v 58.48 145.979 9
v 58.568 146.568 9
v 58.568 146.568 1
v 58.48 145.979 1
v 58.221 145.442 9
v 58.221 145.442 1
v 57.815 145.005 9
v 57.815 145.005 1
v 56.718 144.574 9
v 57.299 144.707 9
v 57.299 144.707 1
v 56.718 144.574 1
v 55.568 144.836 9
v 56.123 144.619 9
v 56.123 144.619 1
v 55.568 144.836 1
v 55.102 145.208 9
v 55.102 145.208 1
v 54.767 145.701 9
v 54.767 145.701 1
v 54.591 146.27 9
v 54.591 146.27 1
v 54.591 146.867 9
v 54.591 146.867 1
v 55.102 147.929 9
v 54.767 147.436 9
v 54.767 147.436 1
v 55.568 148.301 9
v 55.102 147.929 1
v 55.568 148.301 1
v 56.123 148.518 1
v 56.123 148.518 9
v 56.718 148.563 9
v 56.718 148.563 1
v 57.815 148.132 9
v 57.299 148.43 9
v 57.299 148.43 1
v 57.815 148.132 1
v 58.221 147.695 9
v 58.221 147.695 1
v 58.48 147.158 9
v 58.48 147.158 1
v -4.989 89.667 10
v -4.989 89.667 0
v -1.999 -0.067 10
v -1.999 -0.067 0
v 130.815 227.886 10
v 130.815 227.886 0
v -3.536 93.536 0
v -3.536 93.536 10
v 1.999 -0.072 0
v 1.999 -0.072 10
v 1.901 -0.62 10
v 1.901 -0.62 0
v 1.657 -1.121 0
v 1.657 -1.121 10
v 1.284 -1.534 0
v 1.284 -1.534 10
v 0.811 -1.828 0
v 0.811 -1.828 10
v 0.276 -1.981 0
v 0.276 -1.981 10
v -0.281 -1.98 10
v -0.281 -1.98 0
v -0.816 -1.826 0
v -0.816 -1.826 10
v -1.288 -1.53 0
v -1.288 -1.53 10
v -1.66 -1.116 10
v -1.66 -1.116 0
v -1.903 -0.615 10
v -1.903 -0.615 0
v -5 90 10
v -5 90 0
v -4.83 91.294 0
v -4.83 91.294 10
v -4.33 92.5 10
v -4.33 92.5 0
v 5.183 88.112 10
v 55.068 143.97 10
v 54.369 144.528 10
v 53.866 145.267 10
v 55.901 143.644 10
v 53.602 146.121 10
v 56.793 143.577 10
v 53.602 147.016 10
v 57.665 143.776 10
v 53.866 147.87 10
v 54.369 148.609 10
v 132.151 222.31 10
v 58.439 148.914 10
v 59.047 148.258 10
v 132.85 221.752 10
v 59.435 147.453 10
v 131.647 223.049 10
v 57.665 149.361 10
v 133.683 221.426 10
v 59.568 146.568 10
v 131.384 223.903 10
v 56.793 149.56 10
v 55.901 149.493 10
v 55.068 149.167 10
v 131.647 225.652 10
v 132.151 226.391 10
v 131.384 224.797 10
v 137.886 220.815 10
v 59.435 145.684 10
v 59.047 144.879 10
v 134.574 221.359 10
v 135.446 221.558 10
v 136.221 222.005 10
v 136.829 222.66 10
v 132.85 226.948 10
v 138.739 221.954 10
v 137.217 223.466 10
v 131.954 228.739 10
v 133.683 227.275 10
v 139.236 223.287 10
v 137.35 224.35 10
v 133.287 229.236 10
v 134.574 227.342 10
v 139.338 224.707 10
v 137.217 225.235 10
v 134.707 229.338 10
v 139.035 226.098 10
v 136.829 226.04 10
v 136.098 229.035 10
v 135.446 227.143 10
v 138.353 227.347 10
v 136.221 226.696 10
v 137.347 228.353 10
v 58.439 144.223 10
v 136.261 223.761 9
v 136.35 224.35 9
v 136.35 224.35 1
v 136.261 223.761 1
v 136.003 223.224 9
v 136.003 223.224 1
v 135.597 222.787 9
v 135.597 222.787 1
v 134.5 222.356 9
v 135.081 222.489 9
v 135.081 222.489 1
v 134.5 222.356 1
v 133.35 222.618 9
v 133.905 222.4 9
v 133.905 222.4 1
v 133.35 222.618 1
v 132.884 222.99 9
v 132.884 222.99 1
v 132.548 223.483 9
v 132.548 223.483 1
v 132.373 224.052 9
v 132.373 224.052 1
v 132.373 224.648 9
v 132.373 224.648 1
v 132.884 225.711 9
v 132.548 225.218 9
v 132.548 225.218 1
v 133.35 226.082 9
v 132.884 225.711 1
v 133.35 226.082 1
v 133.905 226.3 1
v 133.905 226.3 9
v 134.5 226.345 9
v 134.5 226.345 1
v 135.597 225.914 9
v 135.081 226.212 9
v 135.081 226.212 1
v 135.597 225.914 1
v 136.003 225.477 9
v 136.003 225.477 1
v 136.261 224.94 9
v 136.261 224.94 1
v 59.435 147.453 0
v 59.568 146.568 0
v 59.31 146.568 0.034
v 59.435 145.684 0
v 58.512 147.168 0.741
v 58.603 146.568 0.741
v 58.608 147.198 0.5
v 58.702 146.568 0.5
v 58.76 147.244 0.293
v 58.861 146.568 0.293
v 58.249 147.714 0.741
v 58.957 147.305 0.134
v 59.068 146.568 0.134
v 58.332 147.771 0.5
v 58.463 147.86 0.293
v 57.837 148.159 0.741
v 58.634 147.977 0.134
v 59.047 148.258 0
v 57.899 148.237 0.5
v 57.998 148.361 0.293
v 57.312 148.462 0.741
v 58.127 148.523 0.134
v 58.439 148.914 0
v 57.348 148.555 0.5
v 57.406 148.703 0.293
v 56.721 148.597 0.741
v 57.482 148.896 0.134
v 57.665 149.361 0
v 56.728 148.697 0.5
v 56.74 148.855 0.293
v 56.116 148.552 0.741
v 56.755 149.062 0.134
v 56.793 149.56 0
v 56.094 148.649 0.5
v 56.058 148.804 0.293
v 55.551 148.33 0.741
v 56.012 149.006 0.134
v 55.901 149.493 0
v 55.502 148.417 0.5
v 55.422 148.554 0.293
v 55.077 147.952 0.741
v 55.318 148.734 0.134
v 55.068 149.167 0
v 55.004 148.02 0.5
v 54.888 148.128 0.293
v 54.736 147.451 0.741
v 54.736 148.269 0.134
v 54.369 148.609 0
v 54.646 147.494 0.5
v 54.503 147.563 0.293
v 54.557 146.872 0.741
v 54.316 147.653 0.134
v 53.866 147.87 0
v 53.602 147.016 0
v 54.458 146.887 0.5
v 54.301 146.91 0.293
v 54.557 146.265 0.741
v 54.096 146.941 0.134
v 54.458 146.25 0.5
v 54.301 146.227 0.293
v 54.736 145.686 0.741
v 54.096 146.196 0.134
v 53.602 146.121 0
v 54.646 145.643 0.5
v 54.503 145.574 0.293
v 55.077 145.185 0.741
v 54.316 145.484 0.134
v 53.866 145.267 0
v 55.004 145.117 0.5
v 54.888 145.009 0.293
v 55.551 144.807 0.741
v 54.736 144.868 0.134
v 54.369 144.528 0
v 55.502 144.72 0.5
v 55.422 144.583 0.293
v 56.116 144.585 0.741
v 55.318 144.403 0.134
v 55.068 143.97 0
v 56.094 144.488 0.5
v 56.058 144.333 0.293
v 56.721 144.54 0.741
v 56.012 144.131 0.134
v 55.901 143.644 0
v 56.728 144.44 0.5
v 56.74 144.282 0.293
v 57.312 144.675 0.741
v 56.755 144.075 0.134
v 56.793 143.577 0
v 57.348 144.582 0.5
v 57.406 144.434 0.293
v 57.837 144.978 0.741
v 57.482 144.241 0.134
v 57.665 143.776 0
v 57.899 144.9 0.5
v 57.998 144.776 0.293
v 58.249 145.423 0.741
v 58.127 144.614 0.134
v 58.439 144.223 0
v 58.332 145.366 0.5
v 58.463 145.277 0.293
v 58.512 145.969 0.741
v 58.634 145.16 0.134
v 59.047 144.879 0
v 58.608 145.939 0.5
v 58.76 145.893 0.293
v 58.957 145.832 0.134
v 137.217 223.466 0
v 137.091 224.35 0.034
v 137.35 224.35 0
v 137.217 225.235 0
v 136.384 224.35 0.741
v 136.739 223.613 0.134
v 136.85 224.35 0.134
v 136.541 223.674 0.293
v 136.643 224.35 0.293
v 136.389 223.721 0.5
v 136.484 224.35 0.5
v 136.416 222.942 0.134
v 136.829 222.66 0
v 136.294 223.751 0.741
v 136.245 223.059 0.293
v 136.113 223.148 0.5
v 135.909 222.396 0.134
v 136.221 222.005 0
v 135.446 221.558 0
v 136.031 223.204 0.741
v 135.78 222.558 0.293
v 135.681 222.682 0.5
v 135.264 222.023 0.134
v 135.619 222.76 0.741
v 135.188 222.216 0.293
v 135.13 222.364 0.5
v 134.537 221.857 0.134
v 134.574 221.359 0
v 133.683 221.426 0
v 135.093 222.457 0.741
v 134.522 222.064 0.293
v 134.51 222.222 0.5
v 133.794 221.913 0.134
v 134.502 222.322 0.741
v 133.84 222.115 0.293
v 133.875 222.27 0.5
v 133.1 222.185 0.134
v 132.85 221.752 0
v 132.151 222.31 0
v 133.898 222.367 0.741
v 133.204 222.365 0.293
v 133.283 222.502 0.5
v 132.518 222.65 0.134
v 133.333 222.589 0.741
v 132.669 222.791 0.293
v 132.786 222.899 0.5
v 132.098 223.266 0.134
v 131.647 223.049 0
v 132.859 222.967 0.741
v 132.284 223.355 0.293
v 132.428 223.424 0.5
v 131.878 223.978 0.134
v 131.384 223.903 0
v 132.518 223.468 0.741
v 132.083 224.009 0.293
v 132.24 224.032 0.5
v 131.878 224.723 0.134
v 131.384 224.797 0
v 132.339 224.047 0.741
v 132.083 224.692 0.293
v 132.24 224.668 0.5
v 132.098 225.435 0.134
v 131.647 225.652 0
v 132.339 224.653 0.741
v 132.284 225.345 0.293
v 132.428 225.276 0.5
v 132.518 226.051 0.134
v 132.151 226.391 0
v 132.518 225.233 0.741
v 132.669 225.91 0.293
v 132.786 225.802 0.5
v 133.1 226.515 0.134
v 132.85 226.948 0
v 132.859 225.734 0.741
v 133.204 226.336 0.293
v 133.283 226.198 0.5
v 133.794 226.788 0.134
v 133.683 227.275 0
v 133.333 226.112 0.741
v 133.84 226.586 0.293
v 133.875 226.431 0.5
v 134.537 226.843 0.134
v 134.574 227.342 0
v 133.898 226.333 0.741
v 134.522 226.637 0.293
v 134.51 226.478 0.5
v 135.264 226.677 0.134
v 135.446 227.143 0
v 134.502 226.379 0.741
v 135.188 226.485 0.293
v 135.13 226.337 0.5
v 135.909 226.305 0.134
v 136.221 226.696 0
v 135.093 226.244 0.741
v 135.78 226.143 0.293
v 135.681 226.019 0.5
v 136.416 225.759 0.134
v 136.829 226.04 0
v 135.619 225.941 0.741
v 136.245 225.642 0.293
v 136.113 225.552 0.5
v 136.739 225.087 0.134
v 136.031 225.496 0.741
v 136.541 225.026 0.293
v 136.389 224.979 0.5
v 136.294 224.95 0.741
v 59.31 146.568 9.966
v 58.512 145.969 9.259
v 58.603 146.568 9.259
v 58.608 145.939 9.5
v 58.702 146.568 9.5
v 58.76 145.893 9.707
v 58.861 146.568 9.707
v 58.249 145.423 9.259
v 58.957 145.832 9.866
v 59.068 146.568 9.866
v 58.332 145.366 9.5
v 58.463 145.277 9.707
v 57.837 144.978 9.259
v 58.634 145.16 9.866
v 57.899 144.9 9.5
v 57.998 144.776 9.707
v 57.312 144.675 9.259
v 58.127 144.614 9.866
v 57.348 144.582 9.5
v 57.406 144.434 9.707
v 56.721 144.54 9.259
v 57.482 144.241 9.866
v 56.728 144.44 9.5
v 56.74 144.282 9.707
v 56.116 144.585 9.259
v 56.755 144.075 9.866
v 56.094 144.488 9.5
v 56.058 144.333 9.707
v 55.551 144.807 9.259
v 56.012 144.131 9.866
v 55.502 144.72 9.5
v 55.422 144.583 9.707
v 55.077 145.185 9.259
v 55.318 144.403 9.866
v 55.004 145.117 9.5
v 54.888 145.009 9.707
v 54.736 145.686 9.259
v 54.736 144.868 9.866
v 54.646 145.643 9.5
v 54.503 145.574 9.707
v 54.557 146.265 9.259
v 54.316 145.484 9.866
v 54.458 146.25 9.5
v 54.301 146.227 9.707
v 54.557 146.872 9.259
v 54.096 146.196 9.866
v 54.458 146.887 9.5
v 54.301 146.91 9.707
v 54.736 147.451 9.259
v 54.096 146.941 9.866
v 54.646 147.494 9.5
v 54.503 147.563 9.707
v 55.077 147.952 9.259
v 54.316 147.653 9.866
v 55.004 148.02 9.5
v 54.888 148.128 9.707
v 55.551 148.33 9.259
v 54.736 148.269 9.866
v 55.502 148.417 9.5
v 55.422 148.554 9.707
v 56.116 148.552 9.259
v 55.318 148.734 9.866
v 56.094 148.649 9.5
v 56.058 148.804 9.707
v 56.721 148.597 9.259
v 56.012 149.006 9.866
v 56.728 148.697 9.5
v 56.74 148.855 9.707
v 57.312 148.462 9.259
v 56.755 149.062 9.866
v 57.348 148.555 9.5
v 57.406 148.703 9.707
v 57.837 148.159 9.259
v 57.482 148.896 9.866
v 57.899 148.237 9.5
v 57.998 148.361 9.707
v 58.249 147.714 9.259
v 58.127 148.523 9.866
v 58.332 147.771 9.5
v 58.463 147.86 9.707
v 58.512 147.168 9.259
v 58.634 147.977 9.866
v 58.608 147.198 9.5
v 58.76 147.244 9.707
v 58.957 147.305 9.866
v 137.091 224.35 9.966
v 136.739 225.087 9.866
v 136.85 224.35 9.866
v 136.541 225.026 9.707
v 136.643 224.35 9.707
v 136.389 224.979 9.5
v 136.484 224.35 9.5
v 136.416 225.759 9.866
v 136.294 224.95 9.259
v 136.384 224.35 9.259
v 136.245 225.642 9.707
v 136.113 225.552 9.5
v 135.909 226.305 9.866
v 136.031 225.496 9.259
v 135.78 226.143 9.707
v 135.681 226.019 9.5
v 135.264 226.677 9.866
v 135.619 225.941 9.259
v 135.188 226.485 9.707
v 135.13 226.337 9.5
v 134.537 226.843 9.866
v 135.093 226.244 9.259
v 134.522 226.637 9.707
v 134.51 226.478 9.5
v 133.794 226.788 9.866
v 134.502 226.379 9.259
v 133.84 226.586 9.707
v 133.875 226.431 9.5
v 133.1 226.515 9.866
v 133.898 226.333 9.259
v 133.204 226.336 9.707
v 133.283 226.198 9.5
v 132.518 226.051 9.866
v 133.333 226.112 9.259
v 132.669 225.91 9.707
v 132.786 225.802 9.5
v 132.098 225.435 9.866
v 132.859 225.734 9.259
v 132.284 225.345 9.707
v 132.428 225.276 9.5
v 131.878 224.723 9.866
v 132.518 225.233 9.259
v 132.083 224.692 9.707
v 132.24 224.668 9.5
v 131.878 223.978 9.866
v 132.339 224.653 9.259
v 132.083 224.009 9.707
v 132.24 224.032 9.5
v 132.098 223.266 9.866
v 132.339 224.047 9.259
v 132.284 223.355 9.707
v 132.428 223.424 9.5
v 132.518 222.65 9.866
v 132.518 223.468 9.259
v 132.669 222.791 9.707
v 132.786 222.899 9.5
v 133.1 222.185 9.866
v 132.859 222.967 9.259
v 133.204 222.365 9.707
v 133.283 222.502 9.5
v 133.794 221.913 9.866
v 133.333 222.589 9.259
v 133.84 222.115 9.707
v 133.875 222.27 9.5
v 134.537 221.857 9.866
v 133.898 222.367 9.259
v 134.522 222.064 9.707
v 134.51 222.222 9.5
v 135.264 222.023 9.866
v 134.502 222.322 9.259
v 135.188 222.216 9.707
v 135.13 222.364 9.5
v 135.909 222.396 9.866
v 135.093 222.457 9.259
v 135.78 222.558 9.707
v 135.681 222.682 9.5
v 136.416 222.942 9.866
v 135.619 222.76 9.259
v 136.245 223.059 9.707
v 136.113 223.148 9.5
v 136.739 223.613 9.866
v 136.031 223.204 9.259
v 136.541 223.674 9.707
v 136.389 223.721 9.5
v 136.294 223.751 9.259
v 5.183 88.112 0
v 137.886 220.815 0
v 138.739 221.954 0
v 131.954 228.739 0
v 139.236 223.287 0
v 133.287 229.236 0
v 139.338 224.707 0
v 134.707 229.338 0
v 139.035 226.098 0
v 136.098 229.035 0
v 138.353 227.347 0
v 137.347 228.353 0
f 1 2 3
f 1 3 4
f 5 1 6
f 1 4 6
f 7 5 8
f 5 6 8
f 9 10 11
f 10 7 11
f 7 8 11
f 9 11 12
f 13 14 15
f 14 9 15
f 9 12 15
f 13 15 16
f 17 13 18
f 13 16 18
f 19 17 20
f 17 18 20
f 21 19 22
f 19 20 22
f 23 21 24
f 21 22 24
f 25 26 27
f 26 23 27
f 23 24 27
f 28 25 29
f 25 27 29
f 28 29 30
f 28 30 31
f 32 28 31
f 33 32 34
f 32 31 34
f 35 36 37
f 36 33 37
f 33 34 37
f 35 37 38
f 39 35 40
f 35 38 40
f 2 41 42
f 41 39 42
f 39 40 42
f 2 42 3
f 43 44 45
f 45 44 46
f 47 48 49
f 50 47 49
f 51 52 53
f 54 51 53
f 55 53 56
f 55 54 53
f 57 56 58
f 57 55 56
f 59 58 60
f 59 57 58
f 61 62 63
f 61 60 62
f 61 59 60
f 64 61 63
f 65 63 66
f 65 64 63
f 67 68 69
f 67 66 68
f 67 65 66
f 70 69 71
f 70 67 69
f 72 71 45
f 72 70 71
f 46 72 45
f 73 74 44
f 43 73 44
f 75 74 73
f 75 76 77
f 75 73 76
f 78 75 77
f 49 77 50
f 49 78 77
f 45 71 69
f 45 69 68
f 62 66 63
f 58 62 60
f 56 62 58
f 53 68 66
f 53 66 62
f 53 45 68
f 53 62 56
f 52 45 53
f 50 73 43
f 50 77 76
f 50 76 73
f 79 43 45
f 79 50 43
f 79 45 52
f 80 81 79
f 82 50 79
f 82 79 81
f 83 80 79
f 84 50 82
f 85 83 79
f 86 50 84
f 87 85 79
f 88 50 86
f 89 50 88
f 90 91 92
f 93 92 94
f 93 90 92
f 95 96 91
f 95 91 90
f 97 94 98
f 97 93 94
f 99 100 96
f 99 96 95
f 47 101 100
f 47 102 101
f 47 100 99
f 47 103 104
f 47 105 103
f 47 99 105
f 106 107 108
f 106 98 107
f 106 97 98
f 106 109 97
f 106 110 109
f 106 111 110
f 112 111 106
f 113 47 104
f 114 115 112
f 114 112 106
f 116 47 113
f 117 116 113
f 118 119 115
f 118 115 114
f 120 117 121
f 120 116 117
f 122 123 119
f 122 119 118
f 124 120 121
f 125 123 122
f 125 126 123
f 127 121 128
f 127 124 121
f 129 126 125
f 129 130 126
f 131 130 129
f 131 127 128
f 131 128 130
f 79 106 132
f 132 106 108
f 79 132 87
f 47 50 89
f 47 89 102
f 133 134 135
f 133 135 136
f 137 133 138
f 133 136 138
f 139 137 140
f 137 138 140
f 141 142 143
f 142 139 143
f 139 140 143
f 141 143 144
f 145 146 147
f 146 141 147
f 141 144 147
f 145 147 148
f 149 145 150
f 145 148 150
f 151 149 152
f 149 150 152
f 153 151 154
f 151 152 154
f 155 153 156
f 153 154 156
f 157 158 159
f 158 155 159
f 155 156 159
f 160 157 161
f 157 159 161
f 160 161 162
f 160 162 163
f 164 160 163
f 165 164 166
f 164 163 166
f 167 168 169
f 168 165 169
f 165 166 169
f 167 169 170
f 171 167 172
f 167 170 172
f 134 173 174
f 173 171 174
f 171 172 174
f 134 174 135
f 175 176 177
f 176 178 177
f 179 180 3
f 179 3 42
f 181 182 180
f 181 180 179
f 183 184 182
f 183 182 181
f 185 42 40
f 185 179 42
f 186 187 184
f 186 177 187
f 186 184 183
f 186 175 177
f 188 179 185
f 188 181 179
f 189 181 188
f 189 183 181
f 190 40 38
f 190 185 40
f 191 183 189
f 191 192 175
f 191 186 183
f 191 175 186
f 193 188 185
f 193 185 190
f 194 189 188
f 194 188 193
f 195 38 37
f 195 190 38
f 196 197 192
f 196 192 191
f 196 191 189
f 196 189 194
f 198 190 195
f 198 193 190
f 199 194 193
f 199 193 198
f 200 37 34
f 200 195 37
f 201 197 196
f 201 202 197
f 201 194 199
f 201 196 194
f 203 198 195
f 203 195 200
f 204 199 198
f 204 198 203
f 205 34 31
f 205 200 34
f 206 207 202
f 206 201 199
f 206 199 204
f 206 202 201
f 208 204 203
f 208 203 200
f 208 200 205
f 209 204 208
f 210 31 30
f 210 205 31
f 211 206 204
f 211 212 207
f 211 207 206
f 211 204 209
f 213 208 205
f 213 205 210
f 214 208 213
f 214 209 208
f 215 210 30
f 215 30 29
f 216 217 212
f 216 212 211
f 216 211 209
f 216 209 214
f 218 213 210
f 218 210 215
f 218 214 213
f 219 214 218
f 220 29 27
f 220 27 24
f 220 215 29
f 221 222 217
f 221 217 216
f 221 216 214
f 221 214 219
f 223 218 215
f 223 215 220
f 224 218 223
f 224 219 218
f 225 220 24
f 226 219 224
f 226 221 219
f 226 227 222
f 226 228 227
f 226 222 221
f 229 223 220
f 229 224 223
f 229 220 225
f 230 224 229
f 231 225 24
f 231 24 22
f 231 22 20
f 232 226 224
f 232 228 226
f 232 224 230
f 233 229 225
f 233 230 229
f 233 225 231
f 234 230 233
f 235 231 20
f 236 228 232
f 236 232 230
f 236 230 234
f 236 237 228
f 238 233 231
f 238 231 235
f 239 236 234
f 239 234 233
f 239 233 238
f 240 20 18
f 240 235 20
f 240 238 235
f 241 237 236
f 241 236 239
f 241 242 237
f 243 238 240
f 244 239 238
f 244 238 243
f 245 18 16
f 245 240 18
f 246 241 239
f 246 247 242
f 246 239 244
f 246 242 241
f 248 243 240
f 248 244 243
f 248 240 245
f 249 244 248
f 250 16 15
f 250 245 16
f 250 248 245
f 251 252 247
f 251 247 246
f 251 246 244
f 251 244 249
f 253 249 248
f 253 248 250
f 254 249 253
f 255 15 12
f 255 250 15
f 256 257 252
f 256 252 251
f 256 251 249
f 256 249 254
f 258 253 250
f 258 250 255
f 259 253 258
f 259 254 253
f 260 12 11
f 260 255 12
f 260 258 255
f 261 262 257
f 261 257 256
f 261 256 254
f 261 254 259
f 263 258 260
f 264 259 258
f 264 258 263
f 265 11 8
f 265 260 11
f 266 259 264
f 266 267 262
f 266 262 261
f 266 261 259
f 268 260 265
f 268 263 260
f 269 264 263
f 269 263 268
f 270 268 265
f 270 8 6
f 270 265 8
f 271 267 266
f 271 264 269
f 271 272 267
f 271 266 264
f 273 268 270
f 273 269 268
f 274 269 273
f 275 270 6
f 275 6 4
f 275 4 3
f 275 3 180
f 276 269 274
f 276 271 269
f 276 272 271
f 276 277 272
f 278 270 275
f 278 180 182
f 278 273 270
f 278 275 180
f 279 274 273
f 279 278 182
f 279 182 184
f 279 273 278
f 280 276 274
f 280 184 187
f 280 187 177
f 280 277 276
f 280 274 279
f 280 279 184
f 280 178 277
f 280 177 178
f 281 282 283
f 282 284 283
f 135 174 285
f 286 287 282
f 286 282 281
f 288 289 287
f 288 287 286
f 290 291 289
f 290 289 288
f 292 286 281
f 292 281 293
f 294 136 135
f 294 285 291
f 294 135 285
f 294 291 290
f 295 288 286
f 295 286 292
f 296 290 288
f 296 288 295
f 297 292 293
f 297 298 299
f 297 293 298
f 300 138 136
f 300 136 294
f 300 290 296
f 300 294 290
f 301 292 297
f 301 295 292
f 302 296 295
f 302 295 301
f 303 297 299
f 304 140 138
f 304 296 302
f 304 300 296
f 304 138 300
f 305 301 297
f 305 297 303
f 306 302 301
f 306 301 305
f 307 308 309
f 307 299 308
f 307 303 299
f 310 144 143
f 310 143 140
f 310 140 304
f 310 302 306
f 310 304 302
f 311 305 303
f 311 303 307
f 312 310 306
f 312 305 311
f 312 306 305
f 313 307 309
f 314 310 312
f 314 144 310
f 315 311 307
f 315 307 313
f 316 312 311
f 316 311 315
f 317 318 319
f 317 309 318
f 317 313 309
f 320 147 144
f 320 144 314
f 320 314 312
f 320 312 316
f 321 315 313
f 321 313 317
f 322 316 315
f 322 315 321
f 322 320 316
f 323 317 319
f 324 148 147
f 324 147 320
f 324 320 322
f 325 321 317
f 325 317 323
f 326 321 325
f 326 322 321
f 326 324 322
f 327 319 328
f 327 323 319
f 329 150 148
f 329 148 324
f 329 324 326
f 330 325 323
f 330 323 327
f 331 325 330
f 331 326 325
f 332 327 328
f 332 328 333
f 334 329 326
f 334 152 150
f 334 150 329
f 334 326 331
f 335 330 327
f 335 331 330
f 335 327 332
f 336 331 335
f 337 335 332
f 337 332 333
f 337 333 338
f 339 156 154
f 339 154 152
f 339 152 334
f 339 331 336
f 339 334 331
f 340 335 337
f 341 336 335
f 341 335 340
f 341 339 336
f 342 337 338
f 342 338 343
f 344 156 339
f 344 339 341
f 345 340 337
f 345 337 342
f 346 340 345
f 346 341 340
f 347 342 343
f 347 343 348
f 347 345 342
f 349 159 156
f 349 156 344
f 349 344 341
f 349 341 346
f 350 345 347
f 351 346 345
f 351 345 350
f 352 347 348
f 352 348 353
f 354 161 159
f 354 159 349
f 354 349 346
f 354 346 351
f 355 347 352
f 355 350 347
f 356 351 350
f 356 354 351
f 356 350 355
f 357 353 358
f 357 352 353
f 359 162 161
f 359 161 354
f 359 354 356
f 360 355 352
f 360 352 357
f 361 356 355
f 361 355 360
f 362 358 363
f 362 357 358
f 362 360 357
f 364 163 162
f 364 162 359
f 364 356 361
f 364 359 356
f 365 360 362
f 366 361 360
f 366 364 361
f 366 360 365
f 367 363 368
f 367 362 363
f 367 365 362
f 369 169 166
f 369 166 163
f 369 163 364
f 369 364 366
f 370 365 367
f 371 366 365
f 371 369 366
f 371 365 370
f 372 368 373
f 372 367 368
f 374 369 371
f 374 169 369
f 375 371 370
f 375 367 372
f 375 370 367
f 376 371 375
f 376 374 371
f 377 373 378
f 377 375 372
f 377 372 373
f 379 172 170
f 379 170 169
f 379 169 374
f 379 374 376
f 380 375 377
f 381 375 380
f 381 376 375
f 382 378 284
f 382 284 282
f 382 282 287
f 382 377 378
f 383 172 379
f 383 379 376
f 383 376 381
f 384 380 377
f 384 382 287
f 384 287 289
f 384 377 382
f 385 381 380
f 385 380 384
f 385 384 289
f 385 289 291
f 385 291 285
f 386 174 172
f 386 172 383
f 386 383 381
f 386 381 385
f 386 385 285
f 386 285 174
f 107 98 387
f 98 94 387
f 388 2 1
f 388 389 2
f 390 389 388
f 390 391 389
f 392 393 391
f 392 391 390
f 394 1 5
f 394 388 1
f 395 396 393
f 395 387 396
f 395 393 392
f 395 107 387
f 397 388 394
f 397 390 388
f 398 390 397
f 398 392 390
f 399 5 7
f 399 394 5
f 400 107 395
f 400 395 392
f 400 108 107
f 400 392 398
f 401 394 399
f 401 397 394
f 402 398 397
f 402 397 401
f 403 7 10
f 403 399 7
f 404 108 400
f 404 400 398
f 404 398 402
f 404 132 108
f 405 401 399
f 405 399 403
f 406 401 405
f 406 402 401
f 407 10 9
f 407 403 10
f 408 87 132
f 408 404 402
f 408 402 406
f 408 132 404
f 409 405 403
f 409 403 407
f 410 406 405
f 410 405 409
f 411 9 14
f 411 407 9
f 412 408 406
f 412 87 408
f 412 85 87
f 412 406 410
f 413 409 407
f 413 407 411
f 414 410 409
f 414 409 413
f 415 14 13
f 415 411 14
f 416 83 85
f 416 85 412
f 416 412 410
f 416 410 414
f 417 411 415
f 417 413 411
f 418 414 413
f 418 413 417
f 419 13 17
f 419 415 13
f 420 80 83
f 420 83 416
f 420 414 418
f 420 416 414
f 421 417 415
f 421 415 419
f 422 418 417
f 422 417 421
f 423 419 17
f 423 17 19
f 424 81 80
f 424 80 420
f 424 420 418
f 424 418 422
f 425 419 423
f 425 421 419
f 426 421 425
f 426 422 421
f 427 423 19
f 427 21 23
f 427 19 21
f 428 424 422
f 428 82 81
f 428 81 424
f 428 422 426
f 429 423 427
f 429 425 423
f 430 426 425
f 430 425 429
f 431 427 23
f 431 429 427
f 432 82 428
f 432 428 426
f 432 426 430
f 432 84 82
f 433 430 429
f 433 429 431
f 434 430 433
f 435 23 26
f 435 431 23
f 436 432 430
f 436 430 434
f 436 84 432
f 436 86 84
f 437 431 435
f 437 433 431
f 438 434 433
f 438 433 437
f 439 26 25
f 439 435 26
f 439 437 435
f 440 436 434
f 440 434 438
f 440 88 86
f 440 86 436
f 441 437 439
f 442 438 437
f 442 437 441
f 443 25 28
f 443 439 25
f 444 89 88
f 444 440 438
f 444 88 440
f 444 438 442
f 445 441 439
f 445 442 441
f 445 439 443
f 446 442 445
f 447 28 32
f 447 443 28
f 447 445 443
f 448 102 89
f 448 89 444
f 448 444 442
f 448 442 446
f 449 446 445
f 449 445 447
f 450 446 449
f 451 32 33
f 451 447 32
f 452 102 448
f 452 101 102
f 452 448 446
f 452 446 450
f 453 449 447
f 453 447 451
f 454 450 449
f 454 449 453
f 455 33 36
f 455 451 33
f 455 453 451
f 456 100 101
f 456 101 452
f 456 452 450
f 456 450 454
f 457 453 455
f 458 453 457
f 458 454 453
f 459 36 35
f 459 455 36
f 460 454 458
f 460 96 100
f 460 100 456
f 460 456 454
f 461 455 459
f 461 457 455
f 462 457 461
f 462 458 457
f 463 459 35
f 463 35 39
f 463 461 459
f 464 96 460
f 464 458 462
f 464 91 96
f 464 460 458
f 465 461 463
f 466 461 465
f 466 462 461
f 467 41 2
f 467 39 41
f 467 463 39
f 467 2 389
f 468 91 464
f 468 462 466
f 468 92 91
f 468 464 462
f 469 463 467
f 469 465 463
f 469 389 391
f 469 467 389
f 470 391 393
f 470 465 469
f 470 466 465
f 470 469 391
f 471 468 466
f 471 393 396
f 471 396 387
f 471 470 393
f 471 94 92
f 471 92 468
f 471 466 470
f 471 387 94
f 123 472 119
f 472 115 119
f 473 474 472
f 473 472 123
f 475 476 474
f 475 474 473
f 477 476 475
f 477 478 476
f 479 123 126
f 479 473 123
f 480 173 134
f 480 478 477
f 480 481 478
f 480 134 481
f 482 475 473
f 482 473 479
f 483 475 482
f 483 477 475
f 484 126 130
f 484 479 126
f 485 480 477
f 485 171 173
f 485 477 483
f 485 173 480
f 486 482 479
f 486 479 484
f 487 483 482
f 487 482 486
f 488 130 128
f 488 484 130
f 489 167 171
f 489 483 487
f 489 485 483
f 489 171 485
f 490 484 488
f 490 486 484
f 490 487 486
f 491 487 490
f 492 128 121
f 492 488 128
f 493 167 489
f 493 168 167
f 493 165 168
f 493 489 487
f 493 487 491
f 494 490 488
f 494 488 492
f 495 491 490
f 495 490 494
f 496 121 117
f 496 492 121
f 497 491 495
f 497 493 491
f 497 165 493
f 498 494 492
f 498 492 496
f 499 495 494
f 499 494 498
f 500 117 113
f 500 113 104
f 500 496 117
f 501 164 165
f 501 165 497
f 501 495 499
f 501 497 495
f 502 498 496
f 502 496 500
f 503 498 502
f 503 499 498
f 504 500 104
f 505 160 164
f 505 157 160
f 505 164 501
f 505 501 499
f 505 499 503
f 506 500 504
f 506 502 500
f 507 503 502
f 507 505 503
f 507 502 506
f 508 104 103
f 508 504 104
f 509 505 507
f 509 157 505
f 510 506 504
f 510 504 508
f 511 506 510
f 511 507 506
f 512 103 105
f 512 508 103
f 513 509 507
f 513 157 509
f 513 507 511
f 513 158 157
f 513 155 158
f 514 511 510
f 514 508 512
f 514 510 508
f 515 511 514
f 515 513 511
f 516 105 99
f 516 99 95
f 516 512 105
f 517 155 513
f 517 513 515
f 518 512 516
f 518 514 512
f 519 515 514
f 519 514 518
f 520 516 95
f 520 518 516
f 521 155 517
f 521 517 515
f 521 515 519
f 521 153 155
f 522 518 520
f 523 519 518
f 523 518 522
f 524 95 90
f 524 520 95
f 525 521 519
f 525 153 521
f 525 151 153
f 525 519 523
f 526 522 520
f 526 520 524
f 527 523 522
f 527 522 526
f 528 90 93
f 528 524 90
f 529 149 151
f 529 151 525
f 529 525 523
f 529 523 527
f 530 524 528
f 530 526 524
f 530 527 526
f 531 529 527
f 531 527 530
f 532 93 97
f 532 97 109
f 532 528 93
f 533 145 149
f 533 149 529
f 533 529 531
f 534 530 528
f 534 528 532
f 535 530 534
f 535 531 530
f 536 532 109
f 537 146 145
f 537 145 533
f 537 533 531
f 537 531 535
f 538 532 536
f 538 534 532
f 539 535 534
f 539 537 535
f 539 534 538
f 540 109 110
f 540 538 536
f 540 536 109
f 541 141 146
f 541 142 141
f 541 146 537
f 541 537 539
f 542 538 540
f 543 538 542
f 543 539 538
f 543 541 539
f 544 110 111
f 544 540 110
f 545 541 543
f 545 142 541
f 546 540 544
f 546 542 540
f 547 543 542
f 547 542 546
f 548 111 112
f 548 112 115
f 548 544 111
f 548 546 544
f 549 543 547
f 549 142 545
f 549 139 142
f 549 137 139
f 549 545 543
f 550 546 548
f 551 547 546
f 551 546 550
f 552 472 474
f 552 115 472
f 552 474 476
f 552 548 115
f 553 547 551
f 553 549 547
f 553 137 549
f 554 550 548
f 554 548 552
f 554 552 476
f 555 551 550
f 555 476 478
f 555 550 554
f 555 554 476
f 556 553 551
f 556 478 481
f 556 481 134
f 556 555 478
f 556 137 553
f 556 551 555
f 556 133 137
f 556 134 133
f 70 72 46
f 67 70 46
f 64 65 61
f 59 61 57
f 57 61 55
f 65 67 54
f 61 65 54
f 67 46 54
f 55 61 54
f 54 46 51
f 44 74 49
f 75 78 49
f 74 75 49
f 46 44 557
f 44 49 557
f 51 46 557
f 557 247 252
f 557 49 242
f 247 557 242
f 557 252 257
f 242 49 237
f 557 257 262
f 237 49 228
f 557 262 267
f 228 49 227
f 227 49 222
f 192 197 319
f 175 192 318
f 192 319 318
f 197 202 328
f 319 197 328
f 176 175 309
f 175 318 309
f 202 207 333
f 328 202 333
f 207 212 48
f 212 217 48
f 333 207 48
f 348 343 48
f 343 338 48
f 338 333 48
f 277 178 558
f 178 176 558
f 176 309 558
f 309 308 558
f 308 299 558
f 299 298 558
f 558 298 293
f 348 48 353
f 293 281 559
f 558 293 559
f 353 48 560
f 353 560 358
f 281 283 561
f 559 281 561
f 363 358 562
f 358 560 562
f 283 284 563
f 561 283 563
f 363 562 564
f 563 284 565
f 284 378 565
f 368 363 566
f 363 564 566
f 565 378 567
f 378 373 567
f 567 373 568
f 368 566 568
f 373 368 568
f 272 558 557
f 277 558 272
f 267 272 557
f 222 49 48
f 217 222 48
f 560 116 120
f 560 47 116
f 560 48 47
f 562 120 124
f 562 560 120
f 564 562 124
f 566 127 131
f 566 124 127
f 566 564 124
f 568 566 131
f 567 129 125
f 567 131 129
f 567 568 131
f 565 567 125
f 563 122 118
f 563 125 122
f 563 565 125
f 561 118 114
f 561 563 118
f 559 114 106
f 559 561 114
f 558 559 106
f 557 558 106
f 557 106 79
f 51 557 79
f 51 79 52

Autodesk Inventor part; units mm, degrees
ref_plane "YZ Plane" through (0, 0, 0) normal (1, 0, 0) x (0, 1, 0)
ref_plane "XZ Plane" through (0, 0, 0) normal (0, 1, 0) x (-1, 0, 0)
ref_plane "XY Plane" through (0, 0, 0) normal (0, 0, 1) x (1, 0, 0)
sketch "Sketch1" plane through (0, 0, 0) normal (0, 0, 1) x (1, 0, 0)
  circle A0 centre (134.3503, 224.3503) radius 2
  arc A1 (-3.5355, 93.5355) -> (-4.9889, 89.6672) centre (0, 90) ccw
  arc A2 (137.8858, 220.8148) -> (130.8148, 227.8858) centre (134.3503, 224.3503) ccw
  arc A3 (-1.9989, -0.0666) -> (1.9987, -0.0722) centre (0, 0) ccw
  circle A4 centre (56.5685, 146.5685) radius 2
  line L0 (-5, 90) -> (-1.9989, -0.0666)
  line L1 (130.8148, 227.8858) -> (-3.5355, 93.5355)
  line L2 (137.8858, 220.8148) -> (5.1833, 88.1122)
  line L3 (5.1833, 88.1122) -> (1.9987, -0.0722)
  dimension "d5" = 4
  dimension "d6" = 10
  dimension "d7" = 10
  dimension "d8" = 4
  dimension "d9" = 4
  dimension "d23" = 90
  dimension "d30" = 5
  dimension "d45" = 80
  dimension "d46" = 110
  dimension "d47" = 135
extrude "Extrusion2" add sketch "Sketch1" along normal blind 10 contours L1 A2 L2 L3 A3 L0 A1
fillet "Fillet1" radius 1 1 edges at (54.5685, 146.5685, 10)
fillet "Fillet2" radius 1 3 edges at (54.5685, 146.5685, 0) (132.3503, 224.3503, 0) (132.3503, 224.3503, 10)
equation "\"BendRadius\" = Thickness"
equation "\"BendReliefWidth\" = Thickness"
equation "\"BendReliefDepth\" = 0.5 * Thickness"
equation "\"CornerReliefSize\" = 4 * Thickness"
equation "\"MinimumRemnant\" = 2 * Thickness"
equation "\"TransitionRadius\" = BendRadius"
equation "\"JacobiRadiusSize\" = Thickness"
equation "\"GapSize\" = Thickness"
equation "\"Thickness\" = 0.5"
properties part number "Leg Spider Crab" material "Aluminum 6061"
